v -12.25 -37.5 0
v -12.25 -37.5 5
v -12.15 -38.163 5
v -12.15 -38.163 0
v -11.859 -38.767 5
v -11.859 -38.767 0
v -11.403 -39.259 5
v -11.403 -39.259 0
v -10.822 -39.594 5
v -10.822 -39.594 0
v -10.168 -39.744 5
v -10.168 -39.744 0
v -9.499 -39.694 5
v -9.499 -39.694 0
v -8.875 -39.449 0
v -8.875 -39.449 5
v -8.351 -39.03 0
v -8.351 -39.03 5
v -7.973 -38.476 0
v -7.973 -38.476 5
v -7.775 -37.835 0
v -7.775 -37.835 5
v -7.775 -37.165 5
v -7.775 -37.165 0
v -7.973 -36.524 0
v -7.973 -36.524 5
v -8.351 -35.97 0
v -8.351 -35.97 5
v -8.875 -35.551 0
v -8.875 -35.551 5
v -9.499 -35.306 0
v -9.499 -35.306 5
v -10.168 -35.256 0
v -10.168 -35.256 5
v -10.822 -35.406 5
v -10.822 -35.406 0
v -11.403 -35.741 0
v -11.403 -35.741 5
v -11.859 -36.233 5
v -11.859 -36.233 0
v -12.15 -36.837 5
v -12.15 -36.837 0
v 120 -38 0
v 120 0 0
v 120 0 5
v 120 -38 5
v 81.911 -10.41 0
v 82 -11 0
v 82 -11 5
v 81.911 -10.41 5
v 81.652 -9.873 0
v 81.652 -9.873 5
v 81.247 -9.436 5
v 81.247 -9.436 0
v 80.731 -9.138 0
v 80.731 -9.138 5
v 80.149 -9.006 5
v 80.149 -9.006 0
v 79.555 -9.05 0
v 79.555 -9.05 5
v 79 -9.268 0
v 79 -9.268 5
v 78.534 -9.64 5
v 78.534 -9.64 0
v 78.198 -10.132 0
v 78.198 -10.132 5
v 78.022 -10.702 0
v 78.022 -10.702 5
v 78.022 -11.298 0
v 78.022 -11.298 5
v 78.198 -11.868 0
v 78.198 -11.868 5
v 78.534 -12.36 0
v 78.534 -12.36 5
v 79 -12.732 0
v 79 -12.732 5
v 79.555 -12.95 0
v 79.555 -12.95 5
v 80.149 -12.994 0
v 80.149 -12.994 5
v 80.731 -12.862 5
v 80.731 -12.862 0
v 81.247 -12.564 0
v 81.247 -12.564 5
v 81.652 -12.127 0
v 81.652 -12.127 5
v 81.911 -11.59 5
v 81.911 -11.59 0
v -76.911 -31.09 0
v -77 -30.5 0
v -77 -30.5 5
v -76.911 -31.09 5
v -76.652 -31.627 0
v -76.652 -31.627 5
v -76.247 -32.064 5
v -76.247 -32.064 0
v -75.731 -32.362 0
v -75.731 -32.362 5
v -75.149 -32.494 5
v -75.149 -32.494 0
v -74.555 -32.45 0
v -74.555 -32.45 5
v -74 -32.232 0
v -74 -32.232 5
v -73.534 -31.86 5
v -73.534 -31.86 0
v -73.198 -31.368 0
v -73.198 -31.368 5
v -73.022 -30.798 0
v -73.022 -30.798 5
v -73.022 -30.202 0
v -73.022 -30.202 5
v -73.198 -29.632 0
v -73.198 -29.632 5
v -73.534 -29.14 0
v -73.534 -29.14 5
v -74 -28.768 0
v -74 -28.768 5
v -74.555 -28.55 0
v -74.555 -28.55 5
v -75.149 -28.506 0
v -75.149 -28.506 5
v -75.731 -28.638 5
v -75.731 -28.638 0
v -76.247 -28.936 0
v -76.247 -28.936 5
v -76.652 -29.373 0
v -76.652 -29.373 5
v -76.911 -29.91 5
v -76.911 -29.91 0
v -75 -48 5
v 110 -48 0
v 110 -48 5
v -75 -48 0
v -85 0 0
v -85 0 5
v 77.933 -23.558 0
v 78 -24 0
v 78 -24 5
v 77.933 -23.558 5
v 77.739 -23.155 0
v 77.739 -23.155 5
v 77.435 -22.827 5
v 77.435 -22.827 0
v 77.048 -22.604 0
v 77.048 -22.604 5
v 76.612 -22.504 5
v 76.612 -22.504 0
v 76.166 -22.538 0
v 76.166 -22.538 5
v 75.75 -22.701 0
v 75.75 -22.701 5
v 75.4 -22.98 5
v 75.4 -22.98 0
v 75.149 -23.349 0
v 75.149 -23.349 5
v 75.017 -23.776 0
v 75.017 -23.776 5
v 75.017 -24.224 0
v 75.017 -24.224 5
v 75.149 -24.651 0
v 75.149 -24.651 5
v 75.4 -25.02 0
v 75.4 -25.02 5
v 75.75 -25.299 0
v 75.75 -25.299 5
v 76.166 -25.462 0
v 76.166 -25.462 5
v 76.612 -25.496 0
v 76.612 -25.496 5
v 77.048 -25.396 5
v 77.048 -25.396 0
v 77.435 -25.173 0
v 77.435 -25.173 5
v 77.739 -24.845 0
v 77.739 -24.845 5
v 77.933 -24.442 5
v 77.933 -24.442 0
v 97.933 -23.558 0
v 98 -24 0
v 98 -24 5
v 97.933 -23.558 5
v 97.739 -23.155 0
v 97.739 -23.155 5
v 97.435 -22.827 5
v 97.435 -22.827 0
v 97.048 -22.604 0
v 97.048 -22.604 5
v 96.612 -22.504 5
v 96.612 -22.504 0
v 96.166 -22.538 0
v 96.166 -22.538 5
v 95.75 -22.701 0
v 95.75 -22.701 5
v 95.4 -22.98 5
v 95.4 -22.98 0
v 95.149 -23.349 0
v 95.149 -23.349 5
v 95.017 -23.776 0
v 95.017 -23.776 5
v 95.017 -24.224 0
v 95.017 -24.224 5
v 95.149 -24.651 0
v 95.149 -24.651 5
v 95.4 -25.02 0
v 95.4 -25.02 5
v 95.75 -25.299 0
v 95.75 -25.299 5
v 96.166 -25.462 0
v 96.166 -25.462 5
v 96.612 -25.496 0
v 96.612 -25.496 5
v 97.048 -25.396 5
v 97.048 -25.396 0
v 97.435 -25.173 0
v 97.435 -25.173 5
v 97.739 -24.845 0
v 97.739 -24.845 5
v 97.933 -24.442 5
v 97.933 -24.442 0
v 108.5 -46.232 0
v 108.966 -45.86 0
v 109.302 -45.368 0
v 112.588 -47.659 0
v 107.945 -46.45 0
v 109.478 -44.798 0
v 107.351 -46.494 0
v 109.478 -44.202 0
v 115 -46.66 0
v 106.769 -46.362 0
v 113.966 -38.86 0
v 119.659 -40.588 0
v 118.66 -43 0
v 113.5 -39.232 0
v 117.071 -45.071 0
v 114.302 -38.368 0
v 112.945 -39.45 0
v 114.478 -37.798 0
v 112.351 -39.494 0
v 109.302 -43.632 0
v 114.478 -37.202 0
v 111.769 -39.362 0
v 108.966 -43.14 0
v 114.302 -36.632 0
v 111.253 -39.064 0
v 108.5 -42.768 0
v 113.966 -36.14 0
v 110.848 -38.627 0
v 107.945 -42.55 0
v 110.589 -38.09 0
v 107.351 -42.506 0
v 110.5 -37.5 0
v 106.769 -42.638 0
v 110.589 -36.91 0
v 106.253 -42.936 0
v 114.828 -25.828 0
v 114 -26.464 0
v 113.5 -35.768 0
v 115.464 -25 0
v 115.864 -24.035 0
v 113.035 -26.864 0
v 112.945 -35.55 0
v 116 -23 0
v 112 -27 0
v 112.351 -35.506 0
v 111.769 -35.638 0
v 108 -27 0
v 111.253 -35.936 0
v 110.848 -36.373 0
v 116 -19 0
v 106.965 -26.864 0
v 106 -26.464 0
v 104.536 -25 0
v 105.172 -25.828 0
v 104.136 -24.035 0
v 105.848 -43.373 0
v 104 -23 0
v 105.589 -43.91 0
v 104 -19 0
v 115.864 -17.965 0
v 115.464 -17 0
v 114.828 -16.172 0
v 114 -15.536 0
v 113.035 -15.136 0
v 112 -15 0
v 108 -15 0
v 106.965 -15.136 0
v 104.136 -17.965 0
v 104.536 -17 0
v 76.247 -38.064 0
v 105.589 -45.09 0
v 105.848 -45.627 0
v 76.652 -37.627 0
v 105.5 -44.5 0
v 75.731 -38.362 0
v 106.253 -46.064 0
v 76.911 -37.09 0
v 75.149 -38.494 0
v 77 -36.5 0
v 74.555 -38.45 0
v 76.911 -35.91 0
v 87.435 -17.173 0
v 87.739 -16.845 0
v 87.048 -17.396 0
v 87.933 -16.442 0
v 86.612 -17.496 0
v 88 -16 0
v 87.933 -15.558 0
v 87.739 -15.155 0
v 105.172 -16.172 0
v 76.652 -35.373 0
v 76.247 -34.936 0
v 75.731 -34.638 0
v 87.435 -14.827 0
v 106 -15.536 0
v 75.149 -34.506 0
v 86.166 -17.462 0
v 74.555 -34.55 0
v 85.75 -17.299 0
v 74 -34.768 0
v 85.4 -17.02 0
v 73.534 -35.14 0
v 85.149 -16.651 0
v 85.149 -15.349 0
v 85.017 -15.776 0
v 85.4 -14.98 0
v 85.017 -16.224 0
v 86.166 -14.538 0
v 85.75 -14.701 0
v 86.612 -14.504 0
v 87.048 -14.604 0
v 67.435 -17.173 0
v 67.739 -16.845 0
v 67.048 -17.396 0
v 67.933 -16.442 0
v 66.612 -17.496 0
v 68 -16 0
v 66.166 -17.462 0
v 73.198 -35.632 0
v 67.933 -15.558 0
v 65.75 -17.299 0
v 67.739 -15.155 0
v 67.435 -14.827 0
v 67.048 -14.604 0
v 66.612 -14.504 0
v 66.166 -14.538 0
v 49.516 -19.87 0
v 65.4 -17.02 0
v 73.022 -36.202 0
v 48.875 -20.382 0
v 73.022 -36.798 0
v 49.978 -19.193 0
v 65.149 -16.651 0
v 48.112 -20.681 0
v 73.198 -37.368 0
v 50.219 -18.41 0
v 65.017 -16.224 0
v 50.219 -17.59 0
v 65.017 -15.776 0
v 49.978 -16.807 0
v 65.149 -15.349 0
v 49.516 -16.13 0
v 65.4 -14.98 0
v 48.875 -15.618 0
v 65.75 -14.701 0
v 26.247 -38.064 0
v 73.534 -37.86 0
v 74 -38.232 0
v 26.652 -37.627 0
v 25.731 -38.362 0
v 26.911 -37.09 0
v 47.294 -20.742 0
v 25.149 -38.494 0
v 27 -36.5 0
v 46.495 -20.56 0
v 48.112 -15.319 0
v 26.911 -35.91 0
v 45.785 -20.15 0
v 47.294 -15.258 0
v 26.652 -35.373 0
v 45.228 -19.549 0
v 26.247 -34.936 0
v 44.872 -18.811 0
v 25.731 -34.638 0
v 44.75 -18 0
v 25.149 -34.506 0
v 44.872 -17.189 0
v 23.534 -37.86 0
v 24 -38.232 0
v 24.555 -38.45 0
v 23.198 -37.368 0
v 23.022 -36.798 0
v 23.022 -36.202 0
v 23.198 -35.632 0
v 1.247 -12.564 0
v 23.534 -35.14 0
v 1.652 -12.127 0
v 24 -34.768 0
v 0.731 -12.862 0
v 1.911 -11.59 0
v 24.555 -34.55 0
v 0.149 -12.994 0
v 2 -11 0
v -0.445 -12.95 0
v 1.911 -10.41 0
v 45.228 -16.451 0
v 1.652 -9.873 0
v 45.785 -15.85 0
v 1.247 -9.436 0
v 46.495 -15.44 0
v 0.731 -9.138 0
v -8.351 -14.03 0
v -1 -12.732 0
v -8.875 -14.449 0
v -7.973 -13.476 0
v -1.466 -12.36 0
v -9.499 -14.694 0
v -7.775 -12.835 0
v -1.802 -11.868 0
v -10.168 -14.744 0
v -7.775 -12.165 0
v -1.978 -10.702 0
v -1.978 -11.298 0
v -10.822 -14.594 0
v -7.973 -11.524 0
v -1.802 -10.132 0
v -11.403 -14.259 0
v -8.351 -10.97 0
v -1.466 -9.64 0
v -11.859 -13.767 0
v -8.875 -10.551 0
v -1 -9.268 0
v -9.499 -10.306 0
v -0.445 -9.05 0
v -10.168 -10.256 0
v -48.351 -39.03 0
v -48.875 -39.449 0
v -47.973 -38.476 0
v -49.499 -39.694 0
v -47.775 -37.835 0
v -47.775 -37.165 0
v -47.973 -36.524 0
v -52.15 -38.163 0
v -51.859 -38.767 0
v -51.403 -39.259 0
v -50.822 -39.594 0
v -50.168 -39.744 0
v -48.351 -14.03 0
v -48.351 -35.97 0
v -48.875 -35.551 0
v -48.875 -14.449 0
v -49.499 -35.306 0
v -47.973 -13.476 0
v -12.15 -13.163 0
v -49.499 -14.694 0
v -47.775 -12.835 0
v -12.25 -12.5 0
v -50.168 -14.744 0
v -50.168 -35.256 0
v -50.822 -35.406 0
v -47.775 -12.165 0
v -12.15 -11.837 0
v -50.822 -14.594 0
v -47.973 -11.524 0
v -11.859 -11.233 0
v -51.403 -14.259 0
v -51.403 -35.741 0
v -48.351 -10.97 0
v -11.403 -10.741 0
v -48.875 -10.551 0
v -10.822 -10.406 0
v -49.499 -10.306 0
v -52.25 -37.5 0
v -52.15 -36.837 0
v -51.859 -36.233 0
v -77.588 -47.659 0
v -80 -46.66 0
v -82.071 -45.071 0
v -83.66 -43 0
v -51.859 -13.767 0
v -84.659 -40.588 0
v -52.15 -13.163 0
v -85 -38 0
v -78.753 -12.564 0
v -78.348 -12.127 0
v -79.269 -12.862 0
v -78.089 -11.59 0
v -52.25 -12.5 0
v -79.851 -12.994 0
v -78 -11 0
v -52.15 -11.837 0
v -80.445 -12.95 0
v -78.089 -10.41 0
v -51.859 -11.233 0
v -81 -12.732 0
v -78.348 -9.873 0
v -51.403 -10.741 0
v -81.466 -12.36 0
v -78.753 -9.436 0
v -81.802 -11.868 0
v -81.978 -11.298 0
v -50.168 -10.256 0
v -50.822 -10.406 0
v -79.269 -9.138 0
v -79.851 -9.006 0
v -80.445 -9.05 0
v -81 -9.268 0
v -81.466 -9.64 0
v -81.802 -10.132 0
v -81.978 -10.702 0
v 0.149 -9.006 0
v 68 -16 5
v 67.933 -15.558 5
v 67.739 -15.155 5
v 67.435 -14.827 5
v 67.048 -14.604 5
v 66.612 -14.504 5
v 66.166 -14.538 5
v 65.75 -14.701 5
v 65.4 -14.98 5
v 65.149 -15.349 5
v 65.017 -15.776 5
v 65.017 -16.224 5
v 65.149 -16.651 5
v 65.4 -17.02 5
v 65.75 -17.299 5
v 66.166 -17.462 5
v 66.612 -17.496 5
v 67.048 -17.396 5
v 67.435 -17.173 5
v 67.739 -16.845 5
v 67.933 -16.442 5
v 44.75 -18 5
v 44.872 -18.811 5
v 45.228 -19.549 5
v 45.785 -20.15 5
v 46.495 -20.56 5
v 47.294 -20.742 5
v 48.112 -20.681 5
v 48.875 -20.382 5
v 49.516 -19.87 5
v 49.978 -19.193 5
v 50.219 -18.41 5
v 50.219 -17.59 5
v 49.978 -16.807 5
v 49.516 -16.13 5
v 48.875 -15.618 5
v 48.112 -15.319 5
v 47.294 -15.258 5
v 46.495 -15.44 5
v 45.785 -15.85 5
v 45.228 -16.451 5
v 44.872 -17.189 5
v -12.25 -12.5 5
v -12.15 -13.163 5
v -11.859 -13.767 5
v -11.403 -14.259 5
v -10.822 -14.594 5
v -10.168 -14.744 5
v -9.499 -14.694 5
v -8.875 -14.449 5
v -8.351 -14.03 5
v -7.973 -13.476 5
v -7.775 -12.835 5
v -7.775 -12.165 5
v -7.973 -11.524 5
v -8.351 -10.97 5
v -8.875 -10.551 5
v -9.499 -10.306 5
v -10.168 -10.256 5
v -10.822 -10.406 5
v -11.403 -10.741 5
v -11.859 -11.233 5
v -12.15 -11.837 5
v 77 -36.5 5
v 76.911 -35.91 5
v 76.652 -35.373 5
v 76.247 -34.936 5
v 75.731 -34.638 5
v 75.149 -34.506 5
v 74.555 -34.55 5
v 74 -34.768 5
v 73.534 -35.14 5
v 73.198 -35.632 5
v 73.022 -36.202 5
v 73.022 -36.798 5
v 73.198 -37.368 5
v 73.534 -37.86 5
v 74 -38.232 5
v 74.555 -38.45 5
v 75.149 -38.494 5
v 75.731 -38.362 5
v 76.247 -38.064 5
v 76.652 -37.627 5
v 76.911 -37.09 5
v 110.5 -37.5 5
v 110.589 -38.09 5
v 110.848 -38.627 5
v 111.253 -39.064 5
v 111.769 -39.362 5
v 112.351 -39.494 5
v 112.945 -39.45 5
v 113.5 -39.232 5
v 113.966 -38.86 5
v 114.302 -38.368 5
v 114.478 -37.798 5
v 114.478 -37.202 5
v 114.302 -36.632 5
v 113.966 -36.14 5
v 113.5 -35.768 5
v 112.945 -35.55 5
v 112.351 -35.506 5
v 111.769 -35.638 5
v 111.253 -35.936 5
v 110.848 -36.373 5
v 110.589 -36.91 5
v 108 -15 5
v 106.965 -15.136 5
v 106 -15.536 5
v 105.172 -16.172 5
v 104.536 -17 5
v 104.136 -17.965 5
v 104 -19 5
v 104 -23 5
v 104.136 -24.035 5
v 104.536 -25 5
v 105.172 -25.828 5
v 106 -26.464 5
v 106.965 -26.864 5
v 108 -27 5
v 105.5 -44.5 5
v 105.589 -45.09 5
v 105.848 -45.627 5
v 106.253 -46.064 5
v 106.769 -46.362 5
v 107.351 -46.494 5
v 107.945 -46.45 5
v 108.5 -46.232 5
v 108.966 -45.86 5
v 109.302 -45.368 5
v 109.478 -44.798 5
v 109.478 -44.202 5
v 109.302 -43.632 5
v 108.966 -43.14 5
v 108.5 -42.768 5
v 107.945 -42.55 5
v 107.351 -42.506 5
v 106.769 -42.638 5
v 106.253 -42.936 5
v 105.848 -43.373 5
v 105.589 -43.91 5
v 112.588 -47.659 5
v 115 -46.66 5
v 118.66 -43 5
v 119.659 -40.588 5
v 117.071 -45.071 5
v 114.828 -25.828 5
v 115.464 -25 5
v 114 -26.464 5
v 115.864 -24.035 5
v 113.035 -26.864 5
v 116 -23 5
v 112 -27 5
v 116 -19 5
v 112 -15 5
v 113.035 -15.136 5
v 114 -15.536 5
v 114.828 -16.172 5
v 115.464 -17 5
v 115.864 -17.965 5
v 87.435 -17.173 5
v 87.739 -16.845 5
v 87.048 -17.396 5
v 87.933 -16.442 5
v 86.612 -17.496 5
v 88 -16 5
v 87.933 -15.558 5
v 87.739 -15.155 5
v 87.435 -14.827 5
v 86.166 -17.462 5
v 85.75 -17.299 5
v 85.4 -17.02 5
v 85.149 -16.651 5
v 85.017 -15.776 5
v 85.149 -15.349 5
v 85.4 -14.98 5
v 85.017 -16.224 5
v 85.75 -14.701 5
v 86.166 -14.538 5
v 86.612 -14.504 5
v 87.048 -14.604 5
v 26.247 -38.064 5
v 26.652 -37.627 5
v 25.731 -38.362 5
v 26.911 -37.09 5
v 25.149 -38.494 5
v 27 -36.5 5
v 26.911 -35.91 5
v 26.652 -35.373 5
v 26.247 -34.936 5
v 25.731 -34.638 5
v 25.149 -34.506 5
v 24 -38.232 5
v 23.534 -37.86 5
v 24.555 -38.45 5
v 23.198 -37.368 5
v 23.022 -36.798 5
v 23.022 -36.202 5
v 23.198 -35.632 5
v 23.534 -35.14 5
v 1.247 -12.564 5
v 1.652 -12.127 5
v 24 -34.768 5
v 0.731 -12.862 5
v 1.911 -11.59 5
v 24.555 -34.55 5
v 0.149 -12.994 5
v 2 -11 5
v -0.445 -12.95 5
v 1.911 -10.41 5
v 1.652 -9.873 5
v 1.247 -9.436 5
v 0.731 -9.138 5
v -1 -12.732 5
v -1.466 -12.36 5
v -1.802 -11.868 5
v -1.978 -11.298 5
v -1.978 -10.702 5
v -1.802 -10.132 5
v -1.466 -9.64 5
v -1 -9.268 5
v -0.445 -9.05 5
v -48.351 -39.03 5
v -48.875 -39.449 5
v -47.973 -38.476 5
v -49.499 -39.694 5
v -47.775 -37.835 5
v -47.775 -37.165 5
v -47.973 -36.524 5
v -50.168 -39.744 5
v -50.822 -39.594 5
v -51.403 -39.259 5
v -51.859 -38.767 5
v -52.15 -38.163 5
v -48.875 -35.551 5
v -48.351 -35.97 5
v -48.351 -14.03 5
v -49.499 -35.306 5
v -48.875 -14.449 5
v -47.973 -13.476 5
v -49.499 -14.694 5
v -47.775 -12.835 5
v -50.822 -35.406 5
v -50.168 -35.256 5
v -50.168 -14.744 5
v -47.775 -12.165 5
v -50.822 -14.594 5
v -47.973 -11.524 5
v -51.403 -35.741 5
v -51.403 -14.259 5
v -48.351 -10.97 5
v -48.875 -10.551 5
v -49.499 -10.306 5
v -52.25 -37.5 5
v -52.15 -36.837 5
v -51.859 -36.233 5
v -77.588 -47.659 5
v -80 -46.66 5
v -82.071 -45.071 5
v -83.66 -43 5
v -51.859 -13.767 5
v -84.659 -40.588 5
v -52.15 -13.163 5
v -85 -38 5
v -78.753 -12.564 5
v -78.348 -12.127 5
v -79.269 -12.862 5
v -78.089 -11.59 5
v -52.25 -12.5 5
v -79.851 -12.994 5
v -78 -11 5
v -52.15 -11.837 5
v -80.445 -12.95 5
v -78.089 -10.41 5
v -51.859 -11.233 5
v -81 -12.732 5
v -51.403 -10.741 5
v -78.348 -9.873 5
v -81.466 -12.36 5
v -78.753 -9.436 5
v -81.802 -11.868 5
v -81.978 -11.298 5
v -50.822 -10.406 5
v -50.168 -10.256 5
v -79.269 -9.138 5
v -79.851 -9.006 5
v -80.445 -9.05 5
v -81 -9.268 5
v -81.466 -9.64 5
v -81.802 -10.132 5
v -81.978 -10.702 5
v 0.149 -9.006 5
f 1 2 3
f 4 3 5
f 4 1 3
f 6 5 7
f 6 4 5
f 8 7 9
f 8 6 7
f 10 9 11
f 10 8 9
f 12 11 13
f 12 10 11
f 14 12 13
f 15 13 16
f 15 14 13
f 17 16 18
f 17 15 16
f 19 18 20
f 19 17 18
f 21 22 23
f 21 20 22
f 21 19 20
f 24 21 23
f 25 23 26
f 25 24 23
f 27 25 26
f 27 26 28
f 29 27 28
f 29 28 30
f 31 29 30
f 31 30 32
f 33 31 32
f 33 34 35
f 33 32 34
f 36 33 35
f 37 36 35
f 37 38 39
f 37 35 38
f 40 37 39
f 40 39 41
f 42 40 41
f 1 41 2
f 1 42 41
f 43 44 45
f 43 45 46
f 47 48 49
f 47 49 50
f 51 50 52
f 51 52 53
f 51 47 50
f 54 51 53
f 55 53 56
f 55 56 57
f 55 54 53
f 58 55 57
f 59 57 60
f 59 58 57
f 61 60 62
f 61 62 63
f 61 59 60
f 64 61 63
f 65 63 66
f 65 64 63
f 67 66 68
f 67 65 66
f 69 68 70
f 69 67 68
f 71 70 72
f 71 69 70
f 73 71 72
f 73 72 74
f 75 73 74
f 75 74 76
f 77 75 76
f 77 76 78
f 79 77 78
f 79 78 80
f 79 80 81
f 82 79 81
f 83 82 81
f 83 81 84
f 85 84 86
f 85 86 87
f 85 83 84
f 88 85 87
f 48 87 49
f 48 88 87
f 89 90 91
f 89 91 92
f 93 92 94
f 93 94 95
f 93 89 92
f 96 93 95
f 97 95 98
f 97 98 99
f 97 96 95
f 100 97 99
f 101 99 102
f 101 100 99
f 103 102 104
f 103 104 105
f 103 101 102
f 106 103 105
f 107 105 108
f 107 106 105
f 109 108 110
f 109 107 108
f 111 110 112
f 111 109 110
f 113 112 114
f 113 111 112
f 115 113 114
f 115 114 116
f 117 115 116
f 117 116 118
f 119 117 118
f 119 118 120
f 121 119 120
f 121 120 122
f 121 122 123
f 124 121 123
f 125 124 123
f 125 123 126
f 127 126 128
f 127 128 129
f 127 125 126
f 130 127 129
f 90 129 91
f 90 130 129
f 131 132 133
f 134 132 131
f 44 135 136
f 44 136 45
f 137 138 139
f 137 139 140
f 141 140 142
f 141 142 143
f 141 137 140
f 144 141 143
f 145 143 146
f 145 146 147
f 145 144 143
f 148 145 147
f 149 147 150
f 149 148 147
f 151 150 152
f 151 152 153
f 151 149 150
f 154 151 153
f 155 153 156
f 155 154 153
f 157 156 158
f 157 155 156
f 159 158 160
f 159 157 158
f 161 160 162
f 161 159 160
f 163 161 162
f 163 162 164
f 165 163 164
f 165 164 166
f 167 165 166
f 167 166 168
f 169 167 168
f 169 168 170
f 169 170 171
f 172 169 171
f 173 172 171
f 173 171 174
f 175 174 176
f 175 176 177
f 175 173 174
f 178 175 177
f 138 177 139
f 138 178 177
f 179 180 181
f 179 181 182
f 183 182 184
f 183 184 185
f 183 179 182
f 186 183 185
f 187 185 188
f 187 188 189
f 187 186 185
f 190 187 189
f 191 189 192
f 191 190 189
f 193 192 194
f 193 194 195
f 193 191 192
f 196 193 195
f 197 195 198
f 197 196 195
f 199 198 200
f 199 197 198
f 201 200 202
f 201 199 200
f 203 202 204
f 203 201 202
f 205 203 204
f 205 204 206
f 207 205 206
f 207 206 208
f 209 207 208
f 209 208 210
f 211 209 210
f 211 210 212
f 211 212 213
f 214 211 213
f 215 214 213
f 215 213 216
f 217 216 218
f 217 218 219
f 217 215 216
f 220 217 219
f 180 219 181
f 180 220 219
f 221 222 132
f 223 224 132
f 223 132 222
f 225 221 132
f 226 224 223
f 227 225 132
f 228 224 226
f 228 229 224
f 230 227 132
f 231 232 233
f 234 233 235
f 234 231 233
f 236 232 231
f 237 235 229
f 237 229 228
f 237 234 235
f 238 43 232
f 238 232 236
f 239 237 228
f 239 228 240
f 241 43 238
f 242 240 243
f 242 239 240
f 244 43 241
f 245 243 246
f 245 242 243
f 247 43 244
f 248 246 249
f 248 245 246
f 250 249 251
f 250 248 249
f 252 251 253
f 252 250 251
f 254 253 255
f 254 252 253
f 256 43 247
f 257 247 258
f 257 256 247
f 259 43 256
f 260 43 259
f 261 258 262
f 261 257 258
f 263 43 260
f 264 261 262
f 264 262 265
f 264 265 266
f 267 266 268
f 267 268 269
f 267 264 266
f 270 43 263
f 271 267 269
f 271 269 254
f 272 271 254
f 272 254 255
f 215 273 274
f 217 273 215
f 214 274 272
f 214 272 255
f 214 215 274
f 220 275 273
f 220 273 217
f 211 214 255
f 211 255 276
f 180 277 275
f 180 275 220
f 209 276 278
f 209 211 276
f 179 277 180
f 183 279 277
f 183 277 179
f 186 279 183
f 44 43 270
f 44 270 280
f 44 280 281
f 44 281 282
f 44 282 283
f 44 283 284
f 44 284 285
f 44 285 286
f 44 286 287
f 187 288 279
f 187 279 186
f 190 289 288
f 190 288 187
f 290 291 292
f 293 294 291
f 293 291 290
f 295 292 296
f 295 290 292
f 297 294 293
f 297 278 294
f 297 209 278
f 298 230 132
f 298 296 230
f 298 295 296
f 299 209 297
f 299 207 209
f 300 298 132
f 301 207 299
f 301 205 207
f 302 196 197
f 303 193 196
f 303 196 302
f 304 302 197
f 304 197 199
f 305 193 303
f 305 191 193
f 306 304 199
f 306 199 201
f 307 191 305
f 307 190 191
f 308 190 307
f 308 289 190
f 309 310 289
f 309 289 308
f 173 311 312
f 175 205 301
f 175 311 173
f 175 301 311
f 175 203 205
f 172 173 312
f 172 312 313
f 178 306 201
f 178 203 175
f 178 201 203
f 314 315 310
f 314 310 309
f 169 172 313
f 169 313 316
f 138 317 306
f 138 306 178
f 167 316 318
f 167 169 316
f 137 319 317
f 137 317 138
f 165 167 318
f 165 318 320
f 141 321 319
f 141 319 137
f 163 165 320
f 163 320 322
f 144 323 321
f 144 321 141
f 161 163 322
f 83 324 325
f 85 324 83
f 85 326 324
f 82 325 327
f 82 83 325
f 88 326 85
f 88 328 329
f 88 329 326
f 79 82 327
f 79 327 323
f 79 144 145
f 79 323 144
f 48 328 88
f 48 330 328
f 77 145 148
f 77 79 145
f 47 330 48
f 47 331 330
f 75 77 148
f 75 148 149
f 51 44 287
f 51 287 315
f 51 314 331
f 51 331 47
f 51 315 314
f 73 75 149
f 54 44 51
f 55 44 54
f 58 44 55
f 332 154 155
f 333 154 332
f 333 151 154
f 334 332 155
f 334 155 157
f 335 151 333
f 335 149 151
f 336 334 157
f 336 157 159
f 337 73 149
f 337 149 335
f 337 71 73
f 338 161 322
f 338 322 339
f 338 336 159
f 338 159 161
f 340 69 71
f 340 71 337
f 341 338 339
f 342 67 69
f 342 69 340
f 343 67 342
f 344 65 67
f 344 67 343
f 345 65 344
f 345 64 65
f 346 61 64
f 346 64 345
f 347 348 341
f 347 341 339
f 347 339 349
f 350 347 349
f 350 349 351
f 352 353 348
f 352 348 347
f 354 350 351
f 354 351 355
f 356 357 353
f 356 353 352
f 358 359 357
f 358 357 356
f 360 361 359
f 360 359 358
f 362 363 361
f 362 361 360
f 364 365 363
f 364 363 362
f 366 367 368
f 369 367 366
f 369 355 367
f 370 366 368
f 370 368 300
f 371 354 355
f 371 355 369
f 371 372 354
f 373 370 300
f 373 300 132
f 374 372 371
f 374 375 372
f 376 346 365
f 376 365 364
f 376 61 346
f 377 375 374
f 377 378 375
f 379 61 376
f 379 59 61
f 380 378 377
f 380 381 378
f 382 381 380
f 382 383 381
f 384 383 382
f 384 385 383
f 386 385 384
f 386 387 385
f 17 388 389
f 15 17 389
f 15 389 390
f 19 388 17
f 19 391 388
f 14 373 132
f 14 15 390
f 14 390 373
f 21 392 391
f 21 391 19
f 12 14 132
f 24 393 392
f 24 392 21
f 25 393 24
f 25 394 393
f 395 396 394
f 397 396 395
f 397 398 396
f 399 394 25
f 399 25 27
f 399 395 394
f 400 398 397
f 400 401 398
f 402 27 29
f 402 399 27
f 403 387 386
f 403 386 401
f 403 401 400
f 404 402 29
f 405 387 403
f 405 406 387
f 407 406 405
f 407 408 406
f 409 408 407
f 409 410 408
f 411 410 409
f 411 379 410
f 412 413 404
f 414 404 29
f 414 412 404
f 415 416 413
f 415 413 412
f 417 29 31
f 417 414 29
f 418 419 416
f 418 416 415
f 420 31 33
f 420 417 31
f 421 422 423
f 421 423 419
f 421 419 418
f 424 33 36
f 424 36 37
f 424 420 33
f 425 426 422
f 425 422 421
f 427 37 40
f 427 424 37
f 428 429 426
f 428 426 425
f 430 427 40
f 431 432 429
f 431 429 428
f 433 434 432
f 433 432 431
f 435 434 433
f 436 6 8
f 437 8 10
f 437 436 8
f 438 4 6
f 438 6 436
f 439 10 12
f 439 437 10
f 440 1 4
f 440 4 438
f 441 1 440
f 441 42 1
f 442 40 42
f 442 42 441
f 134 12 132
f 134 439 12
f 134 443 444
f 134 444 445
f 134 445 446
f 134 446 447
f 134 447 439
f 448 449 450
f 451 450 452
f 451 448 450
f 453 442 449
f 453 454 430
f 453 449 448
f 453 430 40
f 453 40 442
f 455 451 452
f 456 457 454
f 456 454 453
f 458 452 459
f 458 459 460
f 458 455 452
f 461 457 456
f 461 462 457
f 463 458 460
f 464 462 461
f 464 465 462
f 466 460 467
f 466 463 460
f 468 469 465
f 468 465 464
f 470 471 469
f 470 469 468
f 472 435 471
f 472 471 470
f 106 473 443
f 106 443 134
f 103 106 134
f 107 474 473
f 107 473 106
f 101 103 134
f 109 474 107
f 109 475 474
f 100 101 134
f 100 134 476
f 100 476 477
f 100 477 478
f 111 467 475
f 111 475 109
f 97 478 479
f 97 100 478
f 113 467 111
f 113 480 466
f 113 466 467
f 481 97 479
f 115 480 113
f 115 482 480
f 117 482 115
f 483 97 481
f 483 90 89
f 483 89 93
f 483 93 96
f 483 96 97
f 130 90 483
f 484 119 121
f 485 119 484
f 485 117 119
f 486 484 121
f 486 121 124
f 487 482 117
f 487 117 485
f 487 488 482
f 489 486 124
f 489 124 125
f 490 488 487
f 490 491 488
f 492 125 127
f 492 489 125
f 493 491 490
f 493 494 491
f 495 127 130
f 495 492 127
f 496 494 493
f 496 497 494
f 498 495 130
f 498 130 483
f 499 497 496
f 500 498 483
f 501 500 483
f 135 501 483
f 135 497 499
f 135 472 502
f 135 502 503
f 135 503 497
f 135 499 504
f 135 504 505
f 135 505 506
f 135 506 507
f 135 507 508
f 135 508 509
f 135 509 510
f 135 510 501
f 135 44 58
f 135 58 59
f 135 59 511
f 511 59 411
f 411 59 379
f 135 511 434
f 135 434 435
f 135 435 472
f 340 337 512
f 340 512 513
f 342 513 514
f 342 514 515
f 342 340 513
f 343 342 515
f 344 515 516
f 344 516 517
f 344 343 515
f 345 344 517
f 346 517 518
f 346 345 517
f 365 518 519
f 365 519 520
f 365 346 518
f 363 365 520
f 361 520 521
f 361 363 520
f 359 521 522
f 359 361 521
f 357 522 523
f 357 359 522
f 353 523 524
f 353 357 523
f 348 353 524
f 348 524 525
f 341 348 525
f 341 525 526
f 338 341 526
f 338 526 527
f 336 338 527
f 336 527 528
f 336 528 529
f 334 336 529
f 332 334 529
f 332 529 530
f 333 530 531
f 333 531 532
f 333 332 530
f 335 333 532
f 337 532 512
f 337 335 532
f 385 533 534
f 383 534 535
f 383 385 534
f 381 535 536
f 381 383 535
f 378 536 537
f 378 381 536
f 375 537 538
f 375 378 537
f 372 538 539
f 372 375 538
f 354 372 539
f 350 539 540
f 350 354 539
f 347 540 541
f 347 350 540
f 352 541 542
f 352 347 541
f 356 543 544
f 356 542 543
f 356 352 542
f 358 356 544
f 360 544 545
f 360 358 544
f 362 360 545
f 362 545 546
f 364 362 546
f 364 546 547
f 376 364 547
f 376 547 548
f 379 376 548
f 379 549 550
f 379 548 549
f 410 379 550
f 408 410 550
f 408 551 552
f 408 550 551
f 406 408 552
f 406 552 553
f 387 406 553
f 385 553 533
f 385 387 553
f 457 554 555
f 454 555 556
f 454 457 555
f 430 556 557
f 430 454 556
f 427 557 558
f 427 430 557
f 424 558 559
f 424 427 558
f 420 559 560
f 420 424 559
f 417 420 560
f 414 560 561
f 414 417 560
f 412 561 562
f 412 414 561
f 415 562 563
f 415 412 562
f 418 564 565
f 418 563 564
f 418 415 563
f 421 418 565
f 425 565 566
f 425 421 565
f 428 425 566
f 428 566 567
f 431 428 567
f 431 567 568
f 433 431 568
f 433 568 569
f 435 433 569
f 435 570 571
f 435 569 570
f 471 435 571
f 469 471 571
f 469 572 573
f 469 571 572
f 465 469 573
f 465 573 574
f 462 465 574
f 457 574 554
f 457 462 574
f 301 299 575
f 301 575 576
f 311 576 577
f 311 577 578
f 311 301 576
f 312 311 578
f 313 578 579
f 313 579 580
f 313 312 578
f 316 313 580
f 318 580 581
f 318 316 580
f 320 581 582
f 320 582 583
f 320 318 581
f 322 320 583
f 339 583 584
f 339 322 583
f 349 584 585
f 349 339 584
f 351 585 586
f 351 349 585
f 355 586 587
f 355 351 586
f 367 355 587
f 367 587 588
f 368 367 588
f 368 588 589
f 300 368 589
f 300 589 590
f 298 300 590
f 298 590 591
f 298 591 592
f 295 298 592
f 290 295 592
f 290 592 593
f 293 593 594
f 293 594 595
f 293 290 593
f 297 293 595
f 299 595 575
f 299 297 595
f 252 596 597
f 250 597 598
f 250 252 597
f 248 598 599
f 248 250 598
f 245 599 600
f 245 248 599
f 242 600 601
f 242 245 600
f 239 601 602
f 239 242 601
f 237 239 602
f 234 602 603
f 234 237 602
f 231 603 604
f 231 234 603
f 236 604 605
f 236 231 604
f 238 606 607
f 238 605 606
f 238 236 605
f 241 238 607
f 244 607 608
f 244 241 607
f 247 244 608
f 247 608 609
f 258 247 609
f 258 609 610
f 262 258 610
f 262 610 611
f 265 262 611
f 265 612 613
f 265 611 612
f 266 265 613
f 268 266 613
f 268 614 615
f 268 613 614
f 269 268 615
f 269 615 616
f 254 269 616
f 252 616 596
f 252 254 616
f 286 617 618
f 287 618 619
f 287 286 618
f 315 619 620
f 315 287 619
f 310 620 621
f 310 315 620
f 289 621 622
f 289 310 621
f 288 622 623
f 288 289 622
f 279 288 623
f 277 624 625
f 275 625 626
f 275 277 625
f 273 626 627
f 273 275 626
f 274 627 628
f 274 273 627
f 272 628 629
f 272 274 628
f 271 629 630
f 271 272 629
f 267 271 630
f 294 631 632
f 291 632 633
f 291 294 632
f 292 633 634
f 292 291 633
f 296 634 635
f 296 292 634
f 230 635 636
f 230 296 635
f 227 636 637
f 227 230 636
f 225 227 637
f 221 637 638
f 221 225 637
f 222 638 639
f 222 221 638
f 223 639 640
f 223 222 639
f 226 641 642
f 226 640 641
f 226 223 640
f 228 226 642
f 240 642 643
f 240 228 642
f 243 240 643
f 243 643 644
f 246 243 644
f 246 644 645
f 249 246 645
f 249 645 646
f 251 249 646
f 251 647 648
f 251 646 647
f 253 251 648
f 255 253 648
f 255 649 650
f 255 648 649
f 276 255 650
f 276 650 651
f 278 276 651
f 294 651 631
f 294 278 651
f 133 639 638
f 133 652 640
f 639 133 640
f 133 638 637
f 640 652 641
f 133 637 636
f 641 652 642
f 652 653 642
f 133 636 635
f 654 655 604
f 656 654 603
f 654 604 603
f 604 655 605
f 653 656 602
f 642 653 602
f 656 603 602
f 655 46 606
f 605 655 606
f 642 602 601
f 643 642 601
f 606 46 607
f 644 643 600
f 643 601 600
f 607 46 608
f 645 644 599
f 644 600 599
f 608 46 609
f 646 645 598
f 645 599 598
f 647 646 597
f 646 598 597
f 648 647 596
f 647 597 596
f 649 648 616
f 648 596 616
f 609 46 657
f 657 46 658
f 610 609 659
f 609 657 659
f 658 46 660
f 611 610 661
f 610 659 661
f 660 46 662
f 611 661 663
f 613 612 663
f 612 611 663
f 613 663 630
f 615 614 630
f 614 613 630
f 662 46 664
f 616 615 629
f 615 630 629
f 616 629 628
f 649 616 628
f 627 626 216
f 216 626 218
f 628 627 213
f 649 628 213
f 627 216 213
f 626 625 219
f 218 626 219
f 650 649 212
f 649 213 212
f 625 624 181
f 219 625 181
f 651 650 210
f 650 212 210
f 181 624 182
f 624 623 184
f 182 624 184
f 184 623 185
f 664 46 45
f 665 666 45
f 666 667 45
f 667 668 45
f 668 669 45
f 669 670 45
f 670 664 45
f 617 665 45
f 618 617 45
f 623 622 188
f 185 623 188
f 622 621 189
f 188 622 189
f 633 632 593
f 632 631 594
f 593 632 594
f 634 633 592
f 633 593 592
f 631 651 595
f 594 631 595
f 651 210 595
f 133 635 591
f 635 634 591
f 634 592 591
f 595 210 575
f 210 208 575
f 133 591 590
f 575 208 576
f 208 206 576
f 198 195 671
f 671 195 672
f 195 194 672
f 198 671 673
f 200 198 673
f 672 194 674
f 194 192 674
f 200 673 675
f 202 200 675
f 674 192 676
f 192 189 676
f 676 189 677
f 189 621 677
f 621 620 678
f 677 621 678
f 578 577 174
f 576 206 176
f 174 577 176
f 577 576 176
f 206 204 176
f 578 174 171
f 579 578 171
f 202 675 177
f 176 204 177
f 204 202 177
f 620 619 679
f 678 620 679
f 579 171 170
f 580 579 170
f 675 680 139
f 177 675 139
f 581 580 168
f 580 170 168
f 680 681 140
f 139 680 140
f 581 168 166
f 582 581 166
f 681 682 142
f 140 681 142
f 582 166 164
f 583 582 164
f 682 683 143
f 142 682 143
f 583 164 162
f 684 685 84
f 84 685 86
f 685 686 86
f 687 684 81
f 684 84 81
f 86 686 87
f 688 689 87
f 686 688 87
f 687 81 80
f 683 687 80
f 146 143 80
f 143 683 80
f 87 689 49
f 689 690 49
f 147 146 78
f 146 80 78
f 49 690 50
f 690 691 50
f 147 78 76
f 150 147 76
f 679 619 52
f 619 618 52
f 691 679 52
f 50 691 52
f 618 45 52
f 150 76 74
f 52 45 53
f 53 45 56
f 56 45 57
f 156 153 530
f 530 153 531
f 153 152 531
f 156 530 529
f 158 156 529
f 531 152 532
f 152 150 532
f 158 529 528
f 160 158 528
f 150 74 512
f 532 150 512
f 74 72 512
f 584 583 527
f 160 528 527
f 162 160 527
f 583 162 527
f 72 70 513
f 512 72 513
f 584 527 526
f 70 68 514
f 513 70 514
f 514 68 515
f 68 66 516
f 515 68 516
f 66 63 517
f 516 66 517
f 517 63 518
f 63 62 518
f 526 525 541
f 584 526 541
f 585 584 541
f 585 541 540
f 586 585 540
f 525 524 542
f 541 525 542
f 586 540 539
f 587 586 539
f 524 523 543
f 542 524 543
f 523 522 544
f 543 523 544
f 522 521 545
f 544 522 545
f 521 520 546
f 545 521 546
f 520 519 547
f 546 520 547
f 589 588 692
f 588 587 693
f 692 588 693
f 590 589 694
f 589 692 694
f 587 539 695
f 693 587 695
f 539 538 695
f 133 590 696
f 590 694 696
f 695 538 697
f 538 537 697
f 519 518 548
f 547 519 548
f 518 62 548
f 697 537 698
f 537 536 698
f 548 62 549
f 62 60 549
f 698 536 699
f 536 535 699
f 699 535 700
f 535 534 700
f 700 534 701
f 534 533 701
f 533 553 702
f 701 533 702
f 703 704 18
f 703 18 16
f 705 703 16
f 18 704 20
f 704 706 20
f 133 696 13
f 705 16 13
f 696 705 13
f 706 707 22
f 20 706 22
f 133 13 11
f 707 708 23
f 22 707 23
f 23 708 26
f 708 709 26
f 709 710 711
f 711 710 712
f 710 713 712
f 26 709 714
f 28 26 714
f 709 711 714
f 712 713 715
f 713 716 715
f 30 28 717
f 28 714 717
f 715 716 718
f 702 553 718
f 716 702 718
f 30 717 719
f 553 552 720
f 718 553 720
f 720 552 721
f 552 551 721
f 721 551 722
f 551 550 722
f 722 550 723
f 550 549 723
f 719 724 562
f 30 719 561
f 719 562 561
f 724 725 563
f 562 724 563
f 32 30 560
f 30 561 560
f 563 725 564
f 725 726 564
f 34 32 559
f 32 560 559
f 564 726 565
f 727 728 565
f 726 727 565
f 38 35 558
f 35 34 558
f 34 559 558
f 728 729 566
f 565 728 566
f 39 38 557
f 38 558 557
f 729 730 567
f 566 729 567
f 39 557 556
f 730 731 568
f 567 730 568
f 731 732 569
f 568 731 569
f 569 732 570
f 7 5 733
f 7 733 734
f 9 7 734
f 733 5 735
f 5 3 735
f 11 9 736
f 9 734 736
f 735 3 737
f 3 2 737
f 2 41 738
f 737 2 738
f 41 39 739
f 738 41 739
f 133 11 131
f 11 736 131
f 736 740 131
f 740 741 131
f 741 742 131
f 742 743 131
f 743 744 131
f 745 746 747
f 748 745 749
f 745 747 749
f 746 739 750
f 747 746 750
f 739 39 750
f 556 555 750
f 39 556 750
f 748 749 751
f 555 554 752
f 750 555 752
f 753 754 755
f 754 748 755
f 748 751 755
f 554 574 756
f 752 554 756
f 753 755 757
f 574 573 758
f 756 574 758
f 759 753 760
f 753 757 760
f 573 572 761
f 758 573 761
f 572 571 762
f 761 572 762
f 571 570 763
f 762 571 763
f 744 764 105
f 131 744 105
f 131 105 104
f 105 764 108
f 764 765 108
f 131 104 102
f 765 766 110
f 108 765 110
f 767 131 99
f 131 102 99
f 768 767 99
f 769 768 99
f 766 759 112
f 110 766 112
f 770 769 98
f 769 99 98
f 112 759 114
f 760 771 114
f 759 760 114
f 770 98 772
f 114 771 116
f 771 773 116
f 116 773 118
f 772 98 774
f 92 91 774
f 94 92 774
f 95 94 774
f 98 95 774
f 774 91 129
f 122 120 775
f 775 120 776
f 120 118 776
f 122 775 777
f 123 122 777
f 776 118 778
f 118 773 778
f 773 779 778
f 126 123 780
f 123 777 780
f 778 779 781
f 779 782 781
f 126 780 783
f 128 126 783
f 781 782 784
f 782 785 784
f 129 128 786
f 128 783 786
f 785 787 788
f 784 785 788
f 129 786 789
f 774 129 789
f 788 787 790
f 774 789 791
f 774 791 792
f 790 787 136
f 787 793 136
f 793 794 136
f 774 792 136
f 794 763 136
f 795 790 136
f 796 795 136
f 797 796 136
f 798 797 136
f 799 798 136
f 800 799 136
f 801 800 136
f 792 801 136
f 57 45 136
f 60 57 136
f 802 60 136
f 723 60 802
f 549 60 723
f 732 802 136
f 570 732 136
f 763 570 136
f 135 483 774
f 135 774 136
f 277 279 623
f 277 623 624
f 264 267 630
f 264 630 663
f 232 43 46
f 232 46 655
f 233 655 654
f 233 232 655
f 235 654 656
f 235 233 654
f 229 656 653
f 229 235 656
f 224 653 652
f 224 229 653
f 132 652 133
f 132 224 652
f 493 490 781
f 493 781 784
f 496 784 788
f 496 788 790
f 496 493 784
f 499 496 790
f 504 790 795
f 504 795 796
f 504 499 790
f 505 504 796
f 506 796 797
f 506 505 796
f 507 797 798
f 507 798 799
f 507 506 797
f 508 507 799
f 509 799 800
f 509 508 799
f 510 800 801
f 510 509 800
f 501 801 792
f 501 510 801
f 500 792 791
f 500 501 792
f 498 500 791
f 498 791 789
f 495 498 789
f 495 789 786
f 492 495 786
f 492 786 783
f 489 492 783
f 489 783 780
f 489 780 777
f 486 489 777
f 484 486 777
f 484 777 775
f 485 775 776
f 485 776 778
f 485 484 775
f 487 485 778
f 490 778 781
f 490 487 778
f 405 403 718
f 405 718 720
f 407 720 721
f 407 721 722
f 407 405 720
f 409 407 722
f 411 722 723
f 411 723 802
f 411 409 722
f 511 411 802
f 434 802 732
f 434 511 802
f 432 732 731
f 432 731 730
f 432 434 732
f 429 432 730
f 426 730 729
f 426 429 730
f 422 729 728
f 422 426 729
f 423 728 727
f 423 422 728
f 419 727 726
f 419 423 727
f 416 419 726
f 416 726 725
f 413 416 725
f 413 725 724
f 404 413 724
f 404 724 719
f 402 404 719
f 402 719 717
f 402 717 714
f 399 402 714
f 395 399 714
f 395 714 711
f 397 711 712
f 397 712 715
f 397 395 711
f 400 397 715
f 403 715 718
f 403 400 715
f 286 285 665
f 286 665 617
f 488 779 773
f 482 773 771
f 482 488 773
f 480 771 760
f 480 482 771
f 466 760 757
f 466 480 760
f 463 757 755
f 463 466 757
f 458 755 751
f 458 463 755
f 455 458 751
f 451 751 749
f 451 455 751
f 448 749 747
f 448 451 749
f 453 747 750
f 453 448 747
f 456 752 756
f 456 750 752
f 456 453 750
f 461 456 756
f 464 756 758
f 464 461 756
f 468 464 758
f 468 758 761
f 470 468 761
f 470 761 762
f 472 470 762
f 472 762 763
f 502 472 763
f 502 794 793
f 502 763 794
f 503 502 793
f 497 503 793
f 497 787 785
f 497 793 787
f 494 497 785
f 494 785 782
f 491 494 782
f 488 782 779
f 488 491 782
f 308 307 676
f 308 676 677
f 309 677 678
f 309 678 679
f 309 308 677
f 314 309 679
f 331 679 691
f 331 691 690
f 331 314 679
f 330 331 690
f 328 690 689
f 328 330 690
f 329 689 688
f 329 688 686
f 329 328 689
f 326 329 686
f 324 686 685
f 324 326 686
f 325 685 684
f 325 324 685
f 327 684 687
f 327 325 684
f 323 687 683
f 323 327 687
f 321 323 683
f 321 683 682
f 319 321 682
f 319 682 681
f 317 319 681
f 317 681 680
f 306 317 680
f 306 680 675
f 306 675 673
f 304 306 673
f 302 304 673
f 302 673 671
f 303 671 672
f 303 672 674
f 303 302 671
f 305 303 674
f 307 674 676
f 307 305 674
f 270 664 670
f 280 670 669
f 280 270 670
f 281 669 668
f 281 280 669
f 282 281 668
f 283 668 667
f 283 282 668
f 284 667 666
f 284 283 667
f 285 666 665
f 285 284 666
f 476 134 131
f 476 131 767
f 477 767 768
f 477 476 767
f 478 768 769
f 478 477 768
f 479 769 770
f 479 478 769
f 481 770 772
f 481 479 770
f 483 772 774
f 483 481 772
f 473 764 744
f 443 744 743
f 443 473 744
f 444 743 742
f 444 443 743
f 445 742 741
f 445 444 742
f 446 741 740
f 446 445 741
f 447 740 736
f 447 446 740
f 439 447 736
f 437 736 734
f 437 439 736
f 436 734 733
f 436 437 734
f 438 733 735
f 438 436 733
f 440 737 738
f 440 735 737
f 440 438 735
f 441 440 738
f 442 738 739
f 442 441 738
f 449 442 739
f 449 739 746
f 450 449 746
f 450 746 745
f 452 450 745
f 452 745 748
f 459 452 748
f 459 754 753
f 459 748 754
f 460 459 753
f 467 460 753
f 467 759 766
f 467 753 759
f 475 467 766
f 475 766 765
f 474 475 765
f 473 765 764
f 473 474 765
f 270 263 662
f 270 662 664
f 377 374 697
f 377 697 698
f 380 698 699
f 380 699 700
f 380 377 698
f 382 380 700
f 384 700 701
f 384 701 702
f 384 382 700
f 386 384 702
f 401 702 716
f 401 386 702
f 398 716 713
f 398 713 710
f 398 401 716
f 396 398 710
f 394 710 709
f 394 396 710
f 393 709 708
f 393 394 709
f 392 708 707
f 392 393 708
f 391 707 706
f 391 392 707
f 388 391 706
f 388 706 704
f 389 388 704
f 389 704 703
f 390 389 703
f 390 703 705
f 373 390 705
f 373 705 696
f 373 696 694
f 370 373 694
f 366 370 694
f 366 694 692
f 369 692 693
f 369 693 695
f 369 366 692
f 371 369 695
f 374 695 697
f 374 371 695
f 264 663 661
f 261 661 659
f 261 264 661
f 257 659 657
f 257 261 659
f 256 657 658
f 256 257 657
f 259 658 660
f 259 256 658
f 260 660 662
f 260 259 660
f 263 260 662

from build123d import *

# Parameters (mm, degrees)
SKETCH_1_R              = 2
EXTRUDE_1_DEPTH         = 5
SKETCH_2_R              = 2.75
SKETCH_2_R_2            = 2
SKETCH_2_R_3            = 2.25
CUT_EXTRUDE_2_DEPTH     = 6
CUT_EXTRUDE_3_OUTLINE_R = 1.5
CUT_EXTRUDE_3_DEPTH     = 5


# Read off the part's stored shape, not the designer's step: 切除-拉伸3
with BuildPart() as part:
    # 草图1 → 凸台-拉伸1 (new body)
    with BuildSketch(Plane.XY):
        with BuildLine():
            Line((-85, 0), (120, 0))
            Line((120, 0), (120, -38))
            ThreePointArc((120, -38), (117.071067812, -45.071067812), (110, -48))
            Line((110, -48), (-75, -48))
            ThreePointArc((-75, -48), (-82.071067812, -45.071067812), (-85, -38))
            Line((-85, -38), (-85, 0))
        make_face()
        with Locations((-80, -11)):
            Circle(SKETCH_1_R, mode=Mode.SUBTRACT)
        with Locations((0, -11)):
            Circle(SKETCH_1_R, mode=Mode.SUBTRACT)
        with Locations((80, -11)):
            Circle(SKETCH_1_R, mode=Mode.SUBTRACT)
        with Locations((75, -36.5)):
            Circle(SKETCH_1_R, mode=Mode.SUBTRACT)
        with Locations(Location((-75, -30.5, 0), (0, 0, 180))):
            Circle(SKETCH_1_R, mode=Mode.SUBTRACT)
        with Locations((25, -36.5)):
            Circle(SKETCH_1_R, mode=Mode.SUBTRACT)
    extrude(amount=EXTRUDE_1_DEPTH)

    # 草图2 → 切除-拉伸2 (cut)
    with BuildSketch(Plane.XY):
        with Locations(Location((47.5, -18, 0), (0, 0, 180))):
            Circle(SKETCH_2_R)
        with Locations(Location((112.5, -37.5, 0), (0, 0, 180))):
            Circle(SKETCH_2_R_2)
        with Locations(Location((107.5, -44.5, 0), (0, 0, 180))):
            Circle(SKETCH_2_R_2)
        with BuildLine():
            ThreePointArc((104, -23), (105.171572875, -25.828427125), (108, -27))
            Line((108, -27), (112, -27))
            ThreePointArc((112, -27), (114.828427125, -25.828427125), (116, -23))
            Line((116, -23), (116, -19))
            ThreePointArc((116, -19), (114.828427125, -16.171572875), (112, -15))
            Line((112, -15), (108, -15))
            ThreePointArc((108, -15), (105.171572875, -16.171572875), (104, -19))
            Line((104, -19), (104, -23))
        make_face()
        with Locations(Location((-50, -12.5, 0), (0, 0, 180))):
            Circle(SKETCH_2_R_3)
        with Locations(Location((-10, -12.5, 0), (0, 0, 180))):
            Circle(SKETCH_2_R_3)
        with Locations(Location((-50, -37.5, 0), (0, 0, 180))):
            Circle(SKETCH_2_R_3)
        with Locations(Location((-10, -37.5, 0), (0, 0, 180))):
            Circle(SKETCH_2_R_3)
    extrude(amount=CUT_EXTRUDE_2_DEPTH, mode=Mode.SUBTRACT)

    # 切除-拉伸3 outline → 切除-拉伸3 (cut)
    with BuildSketch(Plane.XY):
        with Locations((96.5, -24)):
            Circle(CUT_EXTRUDE_3_OUTLINE_R)
        with Locations((86.5, -16)):
            Circle(CUT_EXTRUDE_3_OUTLINE_R)
        with Locations((76.5, -24)):
            Circle(CUT_EXTRUDE_3_OUTLINE_R)
        with Locations((66.5, -16)):
            Circle(CUT_EXTRUDE_3_OUTLINE_R)
    extrude(amount=CUT_EXTRUDE_3_DEPTH, mode=Mode.SUBTRACT)


solid = part.part
